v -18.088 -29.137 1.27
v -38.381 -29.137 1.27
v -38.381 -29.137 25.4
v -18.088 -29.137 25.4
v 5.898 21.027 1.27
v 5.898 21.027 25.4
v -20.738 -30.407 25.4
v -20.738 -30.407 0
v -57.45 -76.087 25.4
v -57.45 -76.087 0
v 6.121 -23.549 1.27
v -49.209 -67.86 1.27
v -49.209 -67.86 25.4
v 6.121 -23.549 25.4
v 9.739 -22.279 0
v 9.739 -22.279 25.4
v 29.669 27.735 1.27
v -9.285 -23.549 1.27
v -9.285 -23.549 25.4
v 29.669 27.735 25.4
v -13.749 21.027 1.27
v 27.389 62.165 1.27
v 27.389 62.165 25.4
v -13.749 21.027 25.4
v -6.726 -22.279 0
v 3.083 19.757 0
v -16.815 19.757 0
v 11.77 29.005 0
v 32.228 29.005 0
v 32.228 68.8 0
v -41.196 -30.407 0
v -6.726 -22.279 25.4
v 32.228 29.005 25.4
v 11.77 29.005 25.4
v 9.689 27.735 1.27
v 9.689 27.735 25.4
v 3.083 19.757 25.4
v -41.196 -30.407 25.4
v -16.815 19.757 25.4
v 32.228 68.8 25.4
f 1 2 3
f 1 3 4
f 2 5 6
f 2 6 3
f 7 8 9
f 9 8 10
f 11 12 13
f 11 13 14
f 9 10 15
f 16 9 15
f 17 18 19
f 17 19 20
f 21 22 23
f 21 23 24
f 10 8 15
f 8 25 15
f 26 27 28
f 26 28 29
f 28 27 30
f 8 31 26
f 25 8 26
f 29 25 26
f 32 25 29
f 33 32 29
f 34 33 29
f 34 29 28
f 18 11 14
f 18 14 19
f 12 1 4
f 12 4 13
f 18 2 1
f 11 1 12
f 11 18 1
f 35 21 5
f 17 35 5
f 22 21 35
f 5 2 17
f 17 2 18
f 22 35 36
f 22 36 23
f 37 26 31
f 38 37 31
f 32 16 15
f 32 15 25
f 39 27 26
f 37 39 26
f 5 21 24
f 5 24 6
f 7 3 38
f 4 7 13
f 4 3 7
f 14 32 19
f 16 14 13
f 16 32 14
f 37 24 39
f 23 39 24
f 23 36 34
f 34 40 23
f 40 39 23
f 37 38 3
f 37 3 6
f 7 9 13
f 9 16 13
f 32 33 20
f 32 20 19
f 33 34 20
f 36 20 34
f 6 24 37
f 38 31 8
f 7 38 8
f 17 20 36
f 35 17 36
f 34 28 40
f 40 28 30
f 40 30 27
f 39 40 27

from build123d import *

# Parameters (mm, degrees)
F1_DEPTH = 25.4
F2_T     = -1.27


with BuildPart() as f1:
    # F0 (on Top) → F1 (new body)
    with BuildSketch(Plane.XY):
        Polygon((11.7702977732, 29.0053766221), (32.2281979024, 68.8001960516), (-16.8147105724, 19.7572857141), (3.0826970469, 19.7572857141), (-41.1960408092, -30.406601727), (-20.7381434739, -30.406601727), (-57.4502646923, -76.0865658522), (9.7388841726, -22.2794916481), (-6.7258845083, -22.2794916481), (32.2281979024, 29.0053766221), align=None)
    extrude(amount=F1_DEPTH)

    # F2
    f2_openings = [f1.faces().sort_by_distance(p)[0] for p in [
        (-5.320253, -2.614371, 25.4),
    ]]
    offset(amount=F2_T, openings=f2_openings, kind=Kind.INTERSECTION)


solid = f1.part
